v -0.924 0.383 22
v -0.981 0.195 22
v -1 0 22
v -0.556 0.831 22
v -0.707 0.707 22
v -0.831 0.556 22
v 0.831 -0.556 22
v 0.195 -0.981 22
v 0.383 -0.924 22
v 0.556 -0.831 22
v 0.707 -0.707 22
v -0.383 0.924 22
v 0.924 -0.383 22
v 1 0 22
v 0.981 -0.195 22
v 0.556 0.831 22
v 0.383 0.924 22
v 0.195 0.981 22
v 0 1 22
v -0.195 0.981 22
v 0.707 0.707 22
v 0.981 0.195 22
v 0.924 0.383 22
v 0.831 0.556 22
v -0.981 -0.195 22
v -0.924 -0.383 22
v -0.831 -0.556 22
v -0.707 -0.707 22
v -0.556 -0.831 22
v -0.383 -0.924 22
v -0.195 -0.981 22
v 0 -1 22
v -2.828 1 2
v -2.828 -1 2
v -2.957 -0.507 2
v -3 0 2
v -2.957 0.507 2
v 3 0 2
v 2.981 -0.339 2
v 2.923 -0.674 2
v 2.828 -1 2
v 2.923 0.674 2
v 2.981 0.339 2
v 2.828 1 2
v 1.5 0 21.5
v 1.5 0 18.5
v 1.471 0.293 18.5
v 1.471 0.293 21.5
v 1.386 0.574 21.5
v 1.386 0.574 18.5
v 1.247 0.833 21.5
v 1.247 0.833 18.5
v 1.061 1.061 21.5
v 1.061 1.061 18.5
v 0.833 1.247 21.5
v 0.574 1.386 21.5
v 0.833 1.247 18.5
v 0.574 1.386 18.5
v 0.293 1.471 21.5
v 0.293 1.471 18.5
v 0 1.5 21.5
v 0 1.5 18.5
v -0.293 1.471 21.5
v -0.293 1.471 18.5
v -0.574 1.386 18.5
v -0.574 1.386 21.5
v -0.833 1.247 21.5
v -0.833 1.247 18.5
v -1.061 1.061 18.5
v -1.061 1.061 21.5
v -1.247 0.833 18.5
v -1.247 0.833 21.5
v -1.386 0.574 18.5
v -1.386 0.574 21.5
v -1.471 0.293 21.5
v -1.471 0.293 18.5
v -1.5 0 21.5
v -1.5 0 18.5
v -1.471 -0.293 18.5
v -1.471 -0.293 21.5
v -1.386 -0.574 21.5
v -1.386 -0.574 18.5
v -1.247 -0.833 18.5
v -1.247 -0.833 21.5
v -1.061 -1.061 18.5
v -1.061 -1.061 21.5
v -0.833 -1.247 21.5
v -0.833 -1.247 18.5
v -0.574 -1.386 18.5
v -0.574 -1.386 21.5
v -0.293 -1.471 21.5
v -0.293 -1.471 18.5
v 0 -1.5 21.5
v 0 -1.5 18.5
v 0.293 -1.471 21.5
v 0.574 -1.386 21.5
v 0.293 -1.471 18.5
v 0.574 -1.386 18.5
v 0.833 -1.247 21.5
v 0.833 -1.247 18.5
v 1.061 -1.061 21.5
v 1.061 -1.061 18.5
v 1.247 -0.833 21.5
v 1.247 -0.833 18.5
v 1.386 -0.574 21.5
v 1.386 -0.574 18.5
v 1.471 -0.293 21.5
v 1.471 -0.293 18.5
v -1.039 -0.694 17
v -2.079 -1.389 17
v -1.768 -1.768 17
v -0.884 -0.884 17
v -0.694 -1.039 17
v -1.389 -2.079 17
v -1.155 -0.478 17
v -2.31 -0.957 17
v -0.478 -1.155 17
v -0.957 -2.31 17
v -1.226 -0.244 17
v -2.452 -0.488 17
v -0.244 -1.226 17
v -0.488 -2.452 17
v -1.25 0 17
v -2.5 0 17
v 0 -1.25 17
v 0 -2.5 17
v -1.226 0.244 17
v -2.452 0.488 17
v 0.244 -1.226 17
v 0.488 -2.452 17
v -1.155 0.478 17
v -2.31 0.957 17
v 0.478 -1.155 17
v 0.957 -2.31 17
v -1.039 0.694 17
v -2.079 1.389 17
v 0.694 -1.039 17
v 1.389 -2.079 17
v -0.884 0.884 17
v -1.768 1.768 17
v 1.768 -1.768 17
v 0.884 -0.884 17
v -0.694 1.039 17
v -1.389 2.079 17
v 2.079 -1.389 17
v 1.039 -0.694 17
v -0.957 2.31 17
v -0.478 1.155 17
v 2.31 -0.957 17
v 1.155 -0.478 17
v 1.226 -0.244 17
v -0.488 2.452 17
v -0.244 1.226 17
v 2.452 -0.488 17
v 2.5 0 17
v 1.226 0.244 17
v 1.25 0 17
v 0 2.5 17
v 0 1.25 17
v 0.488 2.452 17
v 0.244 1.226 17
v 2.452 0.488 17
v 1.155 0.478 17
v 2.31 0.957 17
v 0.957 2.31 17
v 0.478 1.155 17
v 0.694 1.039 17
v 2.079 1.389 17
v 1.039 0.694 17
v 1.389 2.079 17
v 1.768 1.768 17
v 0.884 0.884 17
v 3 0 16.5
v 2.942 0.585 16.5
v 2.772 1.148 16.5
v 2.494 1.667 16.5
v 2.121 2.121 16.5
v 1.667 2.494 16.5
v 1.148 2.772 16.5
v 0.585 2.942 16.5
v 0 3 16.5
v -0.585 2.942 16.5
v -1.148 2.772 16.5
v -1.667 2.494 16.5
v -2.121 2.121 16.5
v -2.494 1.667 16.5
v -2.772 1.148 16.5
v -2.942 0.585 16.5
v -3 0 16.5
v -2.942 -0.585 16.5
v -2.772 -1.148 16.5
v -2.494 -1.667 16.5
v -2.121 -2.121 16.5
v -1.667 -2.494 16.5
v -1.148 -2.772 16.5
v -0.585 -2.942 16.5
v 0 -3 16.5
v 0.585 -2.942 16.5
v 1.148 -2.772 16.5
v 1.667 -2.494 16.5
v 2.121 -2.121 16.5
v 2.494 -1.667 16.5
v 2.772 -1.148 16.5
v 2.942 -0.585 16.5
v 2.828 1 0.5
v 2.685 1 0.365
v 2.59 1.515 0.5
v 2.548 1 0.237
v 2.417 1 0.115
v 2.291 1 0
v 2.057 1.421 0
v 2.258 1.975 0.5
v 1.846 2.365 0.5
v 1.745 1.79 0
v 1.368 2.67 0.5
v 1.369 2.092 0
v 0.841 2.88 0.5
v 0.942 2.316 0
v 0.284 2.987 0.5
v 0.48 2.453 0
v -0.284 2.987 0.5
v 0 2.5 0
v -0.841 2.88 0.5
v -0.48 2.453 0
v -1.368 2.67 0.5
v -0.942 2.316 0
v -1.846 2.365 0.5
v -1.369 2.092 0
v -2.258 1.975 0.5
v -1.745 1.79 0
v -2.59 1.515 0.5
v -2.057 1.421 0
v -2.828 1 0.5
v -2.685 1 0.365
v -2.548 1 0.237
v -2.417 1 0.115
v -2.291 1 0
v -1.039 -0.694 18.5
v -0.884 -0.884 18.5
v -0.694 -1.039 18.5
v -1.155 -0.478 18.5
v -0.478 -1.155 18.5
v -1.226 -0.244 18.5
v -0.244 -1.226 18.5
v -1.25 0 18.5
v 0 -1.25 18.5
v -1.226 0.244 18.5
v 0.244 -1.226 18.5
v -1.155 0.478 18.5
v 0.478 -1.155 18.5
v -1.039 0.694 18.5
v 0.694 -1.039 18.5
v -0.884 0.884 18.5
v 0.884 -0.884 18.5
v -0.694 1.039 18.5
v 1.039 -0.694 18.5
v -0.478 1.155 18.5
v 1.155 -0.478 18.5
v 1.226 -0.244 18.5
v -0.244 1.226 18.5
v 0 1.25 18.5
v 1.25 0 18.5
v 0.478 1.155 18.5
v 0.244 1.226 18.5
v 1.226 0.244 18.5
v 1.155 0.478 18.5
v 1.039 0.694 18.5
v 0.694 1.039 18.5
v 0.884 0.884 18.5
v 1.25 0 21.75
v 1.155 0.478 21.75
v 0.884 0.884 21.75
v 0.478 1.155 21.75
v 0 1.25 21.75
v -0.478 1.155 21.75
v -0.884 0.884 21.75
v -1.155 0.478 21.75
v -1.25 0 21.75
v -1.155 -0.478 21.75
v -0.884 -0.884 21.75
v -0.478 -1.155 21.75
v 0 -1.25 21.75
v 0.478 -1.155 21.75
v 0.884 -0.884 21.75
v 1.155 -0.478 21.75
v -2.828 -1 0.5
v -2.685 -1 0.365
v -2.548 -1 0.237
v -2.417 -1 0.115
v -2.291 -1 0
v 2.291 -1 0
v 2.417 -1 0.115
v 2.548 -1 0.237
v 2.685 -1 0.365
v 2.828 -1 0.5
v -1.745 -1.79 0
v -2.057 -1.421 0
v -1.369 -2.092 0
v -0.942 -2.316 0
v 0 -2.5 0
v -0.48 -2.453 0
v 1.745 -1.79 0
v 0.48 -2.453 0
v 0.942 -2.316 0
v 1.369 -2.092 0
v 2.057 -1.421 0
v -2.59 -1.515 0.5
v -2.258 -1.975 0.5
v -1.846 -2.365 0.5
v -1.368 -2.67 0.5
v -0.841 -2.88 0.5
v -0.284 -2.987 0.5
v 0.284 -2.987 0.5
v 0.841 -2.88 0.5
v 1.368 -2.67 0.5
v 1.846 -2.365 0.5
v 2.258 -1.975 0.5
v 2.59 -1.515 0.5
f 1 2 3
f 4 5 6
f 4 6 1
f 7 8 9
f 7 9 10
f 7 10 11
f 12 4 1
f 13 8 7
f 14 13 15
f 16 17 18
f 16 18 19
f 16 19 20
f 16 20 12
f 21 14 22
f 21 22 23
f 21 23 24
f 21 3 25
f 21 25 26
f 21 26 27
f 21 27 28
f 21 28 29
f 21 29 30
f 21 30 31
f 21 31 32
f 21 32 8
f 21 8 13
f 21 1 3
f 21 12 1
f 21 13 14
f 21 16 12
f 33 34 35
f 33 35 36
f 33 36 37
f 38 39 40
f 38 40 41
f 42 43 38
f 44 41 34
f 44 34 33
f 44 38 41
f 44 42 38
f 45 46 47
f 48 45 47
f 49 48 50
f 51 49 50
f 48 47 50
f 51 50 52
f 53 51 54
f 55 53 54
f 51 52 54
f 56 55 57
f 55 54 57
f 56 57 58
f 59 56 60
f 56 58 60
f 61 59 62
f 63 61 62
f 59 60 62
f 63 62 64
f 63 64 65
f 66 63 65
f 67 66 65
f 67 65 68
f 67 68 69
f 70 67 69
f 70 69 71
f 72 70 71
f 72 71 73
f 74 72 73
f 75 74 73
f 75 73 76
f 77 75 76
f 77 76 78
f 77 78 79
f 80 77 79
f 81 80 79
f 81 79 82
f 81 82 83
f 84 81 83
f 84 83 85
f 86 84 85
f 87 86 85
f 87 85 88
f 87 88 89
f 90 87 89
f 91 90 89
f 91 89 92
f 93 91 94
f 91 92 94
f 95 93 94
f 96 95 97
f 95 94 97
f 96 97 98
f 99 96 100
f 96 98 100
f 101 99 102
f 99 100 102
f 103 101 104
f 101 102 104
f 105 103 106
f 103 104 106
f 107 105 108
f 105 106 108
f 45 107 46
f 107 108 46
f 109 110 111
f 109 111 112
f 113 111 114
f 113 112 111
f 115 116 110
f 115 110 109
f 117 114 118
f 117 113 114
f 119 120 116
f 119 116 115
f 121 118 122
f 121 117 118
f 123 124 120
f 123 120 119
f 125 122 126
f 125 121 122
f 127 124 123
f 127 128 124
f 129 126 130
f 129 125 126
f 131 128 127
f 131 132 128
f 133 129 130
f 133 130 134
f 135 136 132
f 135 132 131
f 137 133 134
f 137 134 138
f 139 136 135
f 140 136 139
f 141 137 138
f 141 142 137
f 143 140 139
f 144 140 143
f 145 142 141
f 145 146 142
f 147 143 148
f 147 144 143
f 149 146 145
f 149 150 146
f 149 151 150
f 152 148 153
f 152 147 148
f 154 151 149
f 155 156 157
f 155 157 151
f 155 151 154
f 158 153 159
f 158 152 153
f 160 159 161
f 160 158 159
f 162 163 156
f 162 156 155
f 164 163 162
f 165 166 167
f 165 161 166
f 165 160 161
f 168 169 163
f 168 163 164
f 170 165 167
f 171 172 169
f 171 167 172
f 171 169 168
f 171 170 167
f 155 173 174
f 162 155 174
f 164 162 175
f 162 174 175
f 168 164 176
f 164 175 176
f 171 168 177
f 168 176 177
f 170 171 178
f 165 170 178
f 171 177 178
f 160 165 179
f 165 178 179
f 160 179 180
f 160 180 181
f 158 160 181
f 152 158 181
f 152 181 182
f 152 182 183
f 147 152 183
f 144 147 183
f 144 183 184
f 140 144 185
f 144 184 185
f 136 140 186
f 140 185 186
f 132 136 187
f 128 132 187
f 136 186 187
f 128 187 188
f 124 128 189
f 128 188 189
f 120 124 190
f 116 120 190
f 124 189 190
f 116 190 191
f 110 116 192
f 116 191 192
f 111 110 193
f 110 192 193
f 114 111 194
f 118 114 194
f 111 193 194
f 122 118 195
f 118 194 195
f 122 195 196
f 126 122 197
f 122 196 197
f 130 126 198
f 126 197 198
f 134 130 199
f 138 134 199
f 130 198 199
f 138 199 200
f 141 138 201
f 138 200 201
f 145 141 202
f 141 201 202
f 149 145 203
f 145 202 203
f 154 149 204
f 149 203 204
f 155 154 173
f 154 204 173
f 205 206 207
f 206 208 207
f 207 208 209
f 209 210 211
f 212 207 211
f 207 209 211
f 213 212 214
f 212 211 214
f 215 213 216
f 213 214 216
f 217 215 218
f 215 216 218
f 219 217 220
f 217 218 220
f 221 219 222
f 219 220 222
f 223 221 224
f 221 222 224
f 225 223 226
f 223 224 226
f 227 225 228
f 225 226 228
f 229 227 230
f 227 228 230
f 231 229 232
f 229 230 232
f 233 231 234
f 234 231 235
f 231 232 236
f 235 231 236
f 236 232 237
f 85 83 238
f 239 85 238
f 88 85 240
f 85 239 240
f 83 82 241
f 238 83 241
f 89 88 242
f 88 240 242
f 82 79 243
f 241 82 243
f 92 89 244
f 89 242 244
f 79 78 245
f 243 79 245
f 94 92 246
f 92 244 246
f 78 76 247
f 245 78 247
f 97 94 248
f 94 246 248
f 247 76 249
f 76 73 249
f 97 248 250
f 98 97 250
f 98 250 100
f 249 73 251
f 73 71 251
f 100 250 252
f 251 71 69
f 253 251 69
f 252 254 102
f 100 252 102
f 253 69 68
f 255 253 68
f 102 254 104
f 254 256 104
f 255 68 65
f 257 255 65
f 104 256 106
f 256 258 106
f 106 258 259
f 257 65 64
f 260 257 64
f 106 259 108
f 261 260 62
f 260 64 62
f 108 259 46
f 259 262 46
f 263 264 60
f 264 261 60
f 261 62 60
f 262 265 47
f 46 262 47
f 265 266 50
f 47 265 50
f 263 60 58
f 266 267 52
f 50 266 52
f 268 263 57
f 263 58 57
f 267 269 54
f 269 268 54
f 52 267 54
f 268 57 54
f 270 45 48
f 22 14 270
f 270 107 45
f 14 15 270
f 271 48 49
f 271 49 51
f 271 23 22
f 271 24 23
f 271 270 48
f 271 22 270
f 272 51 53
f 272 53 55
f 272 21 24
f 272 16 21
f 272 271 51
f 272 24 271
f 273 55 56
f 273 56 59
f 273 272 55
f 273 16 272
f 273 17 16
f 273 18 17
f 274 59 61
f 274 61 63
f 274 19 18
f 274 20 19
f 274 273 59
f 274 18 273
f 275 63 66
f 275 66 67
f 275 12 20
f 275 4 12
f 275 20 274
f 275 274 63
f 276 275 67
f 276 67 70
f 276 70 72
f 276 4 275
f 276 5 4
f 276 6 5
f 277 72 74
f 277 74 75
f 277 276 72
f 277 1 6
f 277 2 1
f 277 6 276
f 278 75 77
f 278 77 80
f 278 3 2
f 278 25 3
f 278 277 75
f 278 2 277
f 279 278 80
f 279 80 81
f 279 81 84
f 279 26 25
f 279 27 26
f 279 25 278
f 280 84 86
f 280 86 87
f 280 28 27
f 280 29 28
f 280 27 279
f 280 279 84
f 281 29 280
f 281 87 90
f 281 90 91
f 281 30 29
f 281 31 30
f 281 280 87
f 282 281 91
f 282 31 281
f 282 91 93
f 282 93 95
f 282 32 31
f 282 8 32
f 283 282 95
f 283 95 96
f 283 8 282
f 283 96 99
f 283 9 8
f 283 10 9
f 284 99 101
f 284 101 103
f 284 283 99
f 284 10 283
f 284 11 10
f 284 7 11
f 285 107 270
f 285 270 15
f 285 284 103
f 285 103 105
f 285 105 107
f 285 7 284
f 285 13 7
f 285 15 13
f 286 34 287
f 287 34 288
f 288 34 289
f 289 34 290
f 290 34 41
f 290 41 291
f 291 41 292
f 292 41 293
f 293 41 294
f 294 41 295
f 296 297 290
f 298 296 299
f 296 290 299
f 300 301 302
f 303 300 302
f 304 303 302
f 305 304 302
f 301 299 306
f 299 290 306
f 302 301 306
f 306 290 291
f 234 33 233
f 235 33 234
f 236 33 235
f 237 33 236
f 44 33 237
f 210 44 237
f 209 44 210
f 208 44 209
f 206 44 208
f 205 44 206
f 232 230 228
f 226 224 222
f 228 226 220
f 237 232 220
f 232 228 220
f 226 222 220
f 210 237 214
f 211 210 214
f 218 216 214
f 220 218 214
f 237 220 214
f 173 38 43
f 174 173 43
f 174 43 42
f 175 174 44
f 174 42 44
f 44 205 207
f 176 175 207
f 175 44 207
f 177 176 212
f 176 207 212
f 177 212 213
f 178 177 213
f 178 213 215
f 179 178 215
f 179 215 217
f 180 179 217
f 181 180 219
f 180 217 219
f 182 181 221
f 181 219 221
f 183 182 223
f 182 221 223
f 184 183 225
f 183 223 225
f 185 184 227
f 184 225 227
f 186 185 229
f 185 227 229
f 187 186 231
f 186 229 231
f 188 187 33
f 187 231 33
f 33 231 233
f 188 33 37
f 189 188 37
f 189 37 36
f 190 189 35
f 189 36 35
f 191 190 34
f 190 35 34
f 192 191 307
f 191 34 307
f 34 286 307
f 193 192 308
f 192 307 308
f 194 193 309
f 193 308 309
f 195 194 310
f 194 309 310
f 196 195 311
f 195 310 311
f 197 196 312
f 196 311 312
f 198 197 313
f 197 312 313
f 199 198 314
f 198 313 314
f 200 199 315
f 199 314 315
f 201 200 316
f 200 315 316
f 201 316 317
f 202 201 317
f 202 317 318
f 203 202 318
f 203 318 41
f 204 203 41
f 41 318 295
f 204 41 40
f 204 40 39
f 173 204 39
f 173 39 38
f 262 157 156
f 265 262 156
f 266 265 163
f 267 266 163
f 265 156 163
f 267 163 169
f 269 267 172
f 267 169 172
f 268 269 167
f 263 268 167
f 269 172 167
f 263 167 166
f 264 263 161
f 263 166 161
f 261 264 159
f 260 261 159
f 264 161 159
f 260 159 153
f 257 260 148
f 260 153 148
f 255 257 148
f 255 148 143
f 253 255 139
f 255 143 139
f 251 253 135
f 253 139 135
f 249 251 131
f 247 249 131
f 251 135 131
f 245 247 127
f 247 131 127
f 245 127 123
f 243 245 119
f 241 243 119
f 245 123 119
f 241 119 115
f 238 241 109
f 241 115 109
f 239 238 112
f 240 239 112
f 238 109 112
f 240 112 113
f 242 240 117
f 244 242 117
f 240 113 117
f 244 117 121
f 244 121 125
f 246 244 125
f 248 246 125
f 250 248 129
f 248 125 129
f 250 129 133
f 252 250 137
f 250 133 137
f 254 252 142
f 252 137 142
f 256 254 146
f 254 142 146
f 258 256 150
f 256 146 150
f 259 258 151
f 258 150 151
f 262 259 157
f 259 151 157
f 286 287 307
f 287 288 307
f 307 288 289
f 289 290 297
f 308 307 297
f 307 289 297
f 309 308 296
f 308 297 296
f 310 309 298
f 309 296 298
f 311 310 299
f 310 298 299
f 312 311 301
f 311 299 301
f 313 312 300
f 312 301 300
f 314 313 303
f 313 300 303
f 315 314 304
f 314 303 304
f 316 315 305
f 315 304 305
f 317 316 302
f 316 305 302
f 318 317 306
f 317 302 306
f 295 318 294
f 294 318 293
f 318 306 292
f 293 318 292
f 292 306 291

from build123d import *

# Parameters (mm, degrees)
SKETCH_1_R          = 3
EXTRUDE_1_DEPTH     = 17
SKETCH_2_R          = 1.5
EXTRUDE_2_DEPTH     = 5
CHAMFER_1_SIZE      = 0.5
SKETCH_3_R          = 1.5
SKETCH_3_R_2        = 1.25
CUT_EXTRUDE_3_DEPTH = 1.5
SKETCH_4_W          = 2
SKETCH_4_H          = 2
CUT_EXTRUDE_4_DEPTH = 10
CHAMFER_2_SIZE      = 0.5


with BuildPart() as part:
    # 草图1 → 拉伸1 (new body)
    with BuildSketch(Plane.XY):
        Circle(SKETCH_1_R)
    extrude(amount=EXTRUDE_1_DEPTH)

    # 草图2 → 拉伸2 (add)
    with BuildSketch(Plane.XY.offset(17)):
        Circle(SKETCH_2_R)
    extrude(amount=EXTRUDE_2_DEPTH)

    # 倒角1
    chamfer_1_edges = [part.edges().sort_by_distance(p)[0] for p in [
        (-1.5, 0, 22),
    ]]
    chamfer(chamfer_1_edges, length=CHAMFER_1_SIZE)

    # 草图3 → 拉伸3 (cut)
    with BuildSketch(Plane.XY.offset(17)):
        Circle(SKETCH_3_R)
        Circle(SKETCH_3_R_2, mode=Mode.SUBTRACT)
    extrude(amount=CUT_EXTRUDE_3_DEPTH, mode=Mode.SUBTRACT)

    # 草图4 → 拉伸4 (cut, symmetric)
    with BuildSketch(Plane(origin=(0, 0, 0), x_dir=(0, 0, -1), z_dir=(1, 0, 0))):
        with Locations((-1, 0)):
            Rectangle(SKETCH_4_W, SKETCH_4_H)
    extrude(amount=CUT_EXTRUDE_4_DEPTH, both=True, mode=Mode.SUBTRACT)

    # 倒角2
    chamfer_2_edges = [part.edges().sort_by_distance(p)[0] for p in [
        (0, 3, 0),
        (0, -3, 0),
        (-3, 0, 17),
    ]]
    chamfer(chamfer_2_edges, length=CHAMFER_2_SIZE)


solid = part.part
